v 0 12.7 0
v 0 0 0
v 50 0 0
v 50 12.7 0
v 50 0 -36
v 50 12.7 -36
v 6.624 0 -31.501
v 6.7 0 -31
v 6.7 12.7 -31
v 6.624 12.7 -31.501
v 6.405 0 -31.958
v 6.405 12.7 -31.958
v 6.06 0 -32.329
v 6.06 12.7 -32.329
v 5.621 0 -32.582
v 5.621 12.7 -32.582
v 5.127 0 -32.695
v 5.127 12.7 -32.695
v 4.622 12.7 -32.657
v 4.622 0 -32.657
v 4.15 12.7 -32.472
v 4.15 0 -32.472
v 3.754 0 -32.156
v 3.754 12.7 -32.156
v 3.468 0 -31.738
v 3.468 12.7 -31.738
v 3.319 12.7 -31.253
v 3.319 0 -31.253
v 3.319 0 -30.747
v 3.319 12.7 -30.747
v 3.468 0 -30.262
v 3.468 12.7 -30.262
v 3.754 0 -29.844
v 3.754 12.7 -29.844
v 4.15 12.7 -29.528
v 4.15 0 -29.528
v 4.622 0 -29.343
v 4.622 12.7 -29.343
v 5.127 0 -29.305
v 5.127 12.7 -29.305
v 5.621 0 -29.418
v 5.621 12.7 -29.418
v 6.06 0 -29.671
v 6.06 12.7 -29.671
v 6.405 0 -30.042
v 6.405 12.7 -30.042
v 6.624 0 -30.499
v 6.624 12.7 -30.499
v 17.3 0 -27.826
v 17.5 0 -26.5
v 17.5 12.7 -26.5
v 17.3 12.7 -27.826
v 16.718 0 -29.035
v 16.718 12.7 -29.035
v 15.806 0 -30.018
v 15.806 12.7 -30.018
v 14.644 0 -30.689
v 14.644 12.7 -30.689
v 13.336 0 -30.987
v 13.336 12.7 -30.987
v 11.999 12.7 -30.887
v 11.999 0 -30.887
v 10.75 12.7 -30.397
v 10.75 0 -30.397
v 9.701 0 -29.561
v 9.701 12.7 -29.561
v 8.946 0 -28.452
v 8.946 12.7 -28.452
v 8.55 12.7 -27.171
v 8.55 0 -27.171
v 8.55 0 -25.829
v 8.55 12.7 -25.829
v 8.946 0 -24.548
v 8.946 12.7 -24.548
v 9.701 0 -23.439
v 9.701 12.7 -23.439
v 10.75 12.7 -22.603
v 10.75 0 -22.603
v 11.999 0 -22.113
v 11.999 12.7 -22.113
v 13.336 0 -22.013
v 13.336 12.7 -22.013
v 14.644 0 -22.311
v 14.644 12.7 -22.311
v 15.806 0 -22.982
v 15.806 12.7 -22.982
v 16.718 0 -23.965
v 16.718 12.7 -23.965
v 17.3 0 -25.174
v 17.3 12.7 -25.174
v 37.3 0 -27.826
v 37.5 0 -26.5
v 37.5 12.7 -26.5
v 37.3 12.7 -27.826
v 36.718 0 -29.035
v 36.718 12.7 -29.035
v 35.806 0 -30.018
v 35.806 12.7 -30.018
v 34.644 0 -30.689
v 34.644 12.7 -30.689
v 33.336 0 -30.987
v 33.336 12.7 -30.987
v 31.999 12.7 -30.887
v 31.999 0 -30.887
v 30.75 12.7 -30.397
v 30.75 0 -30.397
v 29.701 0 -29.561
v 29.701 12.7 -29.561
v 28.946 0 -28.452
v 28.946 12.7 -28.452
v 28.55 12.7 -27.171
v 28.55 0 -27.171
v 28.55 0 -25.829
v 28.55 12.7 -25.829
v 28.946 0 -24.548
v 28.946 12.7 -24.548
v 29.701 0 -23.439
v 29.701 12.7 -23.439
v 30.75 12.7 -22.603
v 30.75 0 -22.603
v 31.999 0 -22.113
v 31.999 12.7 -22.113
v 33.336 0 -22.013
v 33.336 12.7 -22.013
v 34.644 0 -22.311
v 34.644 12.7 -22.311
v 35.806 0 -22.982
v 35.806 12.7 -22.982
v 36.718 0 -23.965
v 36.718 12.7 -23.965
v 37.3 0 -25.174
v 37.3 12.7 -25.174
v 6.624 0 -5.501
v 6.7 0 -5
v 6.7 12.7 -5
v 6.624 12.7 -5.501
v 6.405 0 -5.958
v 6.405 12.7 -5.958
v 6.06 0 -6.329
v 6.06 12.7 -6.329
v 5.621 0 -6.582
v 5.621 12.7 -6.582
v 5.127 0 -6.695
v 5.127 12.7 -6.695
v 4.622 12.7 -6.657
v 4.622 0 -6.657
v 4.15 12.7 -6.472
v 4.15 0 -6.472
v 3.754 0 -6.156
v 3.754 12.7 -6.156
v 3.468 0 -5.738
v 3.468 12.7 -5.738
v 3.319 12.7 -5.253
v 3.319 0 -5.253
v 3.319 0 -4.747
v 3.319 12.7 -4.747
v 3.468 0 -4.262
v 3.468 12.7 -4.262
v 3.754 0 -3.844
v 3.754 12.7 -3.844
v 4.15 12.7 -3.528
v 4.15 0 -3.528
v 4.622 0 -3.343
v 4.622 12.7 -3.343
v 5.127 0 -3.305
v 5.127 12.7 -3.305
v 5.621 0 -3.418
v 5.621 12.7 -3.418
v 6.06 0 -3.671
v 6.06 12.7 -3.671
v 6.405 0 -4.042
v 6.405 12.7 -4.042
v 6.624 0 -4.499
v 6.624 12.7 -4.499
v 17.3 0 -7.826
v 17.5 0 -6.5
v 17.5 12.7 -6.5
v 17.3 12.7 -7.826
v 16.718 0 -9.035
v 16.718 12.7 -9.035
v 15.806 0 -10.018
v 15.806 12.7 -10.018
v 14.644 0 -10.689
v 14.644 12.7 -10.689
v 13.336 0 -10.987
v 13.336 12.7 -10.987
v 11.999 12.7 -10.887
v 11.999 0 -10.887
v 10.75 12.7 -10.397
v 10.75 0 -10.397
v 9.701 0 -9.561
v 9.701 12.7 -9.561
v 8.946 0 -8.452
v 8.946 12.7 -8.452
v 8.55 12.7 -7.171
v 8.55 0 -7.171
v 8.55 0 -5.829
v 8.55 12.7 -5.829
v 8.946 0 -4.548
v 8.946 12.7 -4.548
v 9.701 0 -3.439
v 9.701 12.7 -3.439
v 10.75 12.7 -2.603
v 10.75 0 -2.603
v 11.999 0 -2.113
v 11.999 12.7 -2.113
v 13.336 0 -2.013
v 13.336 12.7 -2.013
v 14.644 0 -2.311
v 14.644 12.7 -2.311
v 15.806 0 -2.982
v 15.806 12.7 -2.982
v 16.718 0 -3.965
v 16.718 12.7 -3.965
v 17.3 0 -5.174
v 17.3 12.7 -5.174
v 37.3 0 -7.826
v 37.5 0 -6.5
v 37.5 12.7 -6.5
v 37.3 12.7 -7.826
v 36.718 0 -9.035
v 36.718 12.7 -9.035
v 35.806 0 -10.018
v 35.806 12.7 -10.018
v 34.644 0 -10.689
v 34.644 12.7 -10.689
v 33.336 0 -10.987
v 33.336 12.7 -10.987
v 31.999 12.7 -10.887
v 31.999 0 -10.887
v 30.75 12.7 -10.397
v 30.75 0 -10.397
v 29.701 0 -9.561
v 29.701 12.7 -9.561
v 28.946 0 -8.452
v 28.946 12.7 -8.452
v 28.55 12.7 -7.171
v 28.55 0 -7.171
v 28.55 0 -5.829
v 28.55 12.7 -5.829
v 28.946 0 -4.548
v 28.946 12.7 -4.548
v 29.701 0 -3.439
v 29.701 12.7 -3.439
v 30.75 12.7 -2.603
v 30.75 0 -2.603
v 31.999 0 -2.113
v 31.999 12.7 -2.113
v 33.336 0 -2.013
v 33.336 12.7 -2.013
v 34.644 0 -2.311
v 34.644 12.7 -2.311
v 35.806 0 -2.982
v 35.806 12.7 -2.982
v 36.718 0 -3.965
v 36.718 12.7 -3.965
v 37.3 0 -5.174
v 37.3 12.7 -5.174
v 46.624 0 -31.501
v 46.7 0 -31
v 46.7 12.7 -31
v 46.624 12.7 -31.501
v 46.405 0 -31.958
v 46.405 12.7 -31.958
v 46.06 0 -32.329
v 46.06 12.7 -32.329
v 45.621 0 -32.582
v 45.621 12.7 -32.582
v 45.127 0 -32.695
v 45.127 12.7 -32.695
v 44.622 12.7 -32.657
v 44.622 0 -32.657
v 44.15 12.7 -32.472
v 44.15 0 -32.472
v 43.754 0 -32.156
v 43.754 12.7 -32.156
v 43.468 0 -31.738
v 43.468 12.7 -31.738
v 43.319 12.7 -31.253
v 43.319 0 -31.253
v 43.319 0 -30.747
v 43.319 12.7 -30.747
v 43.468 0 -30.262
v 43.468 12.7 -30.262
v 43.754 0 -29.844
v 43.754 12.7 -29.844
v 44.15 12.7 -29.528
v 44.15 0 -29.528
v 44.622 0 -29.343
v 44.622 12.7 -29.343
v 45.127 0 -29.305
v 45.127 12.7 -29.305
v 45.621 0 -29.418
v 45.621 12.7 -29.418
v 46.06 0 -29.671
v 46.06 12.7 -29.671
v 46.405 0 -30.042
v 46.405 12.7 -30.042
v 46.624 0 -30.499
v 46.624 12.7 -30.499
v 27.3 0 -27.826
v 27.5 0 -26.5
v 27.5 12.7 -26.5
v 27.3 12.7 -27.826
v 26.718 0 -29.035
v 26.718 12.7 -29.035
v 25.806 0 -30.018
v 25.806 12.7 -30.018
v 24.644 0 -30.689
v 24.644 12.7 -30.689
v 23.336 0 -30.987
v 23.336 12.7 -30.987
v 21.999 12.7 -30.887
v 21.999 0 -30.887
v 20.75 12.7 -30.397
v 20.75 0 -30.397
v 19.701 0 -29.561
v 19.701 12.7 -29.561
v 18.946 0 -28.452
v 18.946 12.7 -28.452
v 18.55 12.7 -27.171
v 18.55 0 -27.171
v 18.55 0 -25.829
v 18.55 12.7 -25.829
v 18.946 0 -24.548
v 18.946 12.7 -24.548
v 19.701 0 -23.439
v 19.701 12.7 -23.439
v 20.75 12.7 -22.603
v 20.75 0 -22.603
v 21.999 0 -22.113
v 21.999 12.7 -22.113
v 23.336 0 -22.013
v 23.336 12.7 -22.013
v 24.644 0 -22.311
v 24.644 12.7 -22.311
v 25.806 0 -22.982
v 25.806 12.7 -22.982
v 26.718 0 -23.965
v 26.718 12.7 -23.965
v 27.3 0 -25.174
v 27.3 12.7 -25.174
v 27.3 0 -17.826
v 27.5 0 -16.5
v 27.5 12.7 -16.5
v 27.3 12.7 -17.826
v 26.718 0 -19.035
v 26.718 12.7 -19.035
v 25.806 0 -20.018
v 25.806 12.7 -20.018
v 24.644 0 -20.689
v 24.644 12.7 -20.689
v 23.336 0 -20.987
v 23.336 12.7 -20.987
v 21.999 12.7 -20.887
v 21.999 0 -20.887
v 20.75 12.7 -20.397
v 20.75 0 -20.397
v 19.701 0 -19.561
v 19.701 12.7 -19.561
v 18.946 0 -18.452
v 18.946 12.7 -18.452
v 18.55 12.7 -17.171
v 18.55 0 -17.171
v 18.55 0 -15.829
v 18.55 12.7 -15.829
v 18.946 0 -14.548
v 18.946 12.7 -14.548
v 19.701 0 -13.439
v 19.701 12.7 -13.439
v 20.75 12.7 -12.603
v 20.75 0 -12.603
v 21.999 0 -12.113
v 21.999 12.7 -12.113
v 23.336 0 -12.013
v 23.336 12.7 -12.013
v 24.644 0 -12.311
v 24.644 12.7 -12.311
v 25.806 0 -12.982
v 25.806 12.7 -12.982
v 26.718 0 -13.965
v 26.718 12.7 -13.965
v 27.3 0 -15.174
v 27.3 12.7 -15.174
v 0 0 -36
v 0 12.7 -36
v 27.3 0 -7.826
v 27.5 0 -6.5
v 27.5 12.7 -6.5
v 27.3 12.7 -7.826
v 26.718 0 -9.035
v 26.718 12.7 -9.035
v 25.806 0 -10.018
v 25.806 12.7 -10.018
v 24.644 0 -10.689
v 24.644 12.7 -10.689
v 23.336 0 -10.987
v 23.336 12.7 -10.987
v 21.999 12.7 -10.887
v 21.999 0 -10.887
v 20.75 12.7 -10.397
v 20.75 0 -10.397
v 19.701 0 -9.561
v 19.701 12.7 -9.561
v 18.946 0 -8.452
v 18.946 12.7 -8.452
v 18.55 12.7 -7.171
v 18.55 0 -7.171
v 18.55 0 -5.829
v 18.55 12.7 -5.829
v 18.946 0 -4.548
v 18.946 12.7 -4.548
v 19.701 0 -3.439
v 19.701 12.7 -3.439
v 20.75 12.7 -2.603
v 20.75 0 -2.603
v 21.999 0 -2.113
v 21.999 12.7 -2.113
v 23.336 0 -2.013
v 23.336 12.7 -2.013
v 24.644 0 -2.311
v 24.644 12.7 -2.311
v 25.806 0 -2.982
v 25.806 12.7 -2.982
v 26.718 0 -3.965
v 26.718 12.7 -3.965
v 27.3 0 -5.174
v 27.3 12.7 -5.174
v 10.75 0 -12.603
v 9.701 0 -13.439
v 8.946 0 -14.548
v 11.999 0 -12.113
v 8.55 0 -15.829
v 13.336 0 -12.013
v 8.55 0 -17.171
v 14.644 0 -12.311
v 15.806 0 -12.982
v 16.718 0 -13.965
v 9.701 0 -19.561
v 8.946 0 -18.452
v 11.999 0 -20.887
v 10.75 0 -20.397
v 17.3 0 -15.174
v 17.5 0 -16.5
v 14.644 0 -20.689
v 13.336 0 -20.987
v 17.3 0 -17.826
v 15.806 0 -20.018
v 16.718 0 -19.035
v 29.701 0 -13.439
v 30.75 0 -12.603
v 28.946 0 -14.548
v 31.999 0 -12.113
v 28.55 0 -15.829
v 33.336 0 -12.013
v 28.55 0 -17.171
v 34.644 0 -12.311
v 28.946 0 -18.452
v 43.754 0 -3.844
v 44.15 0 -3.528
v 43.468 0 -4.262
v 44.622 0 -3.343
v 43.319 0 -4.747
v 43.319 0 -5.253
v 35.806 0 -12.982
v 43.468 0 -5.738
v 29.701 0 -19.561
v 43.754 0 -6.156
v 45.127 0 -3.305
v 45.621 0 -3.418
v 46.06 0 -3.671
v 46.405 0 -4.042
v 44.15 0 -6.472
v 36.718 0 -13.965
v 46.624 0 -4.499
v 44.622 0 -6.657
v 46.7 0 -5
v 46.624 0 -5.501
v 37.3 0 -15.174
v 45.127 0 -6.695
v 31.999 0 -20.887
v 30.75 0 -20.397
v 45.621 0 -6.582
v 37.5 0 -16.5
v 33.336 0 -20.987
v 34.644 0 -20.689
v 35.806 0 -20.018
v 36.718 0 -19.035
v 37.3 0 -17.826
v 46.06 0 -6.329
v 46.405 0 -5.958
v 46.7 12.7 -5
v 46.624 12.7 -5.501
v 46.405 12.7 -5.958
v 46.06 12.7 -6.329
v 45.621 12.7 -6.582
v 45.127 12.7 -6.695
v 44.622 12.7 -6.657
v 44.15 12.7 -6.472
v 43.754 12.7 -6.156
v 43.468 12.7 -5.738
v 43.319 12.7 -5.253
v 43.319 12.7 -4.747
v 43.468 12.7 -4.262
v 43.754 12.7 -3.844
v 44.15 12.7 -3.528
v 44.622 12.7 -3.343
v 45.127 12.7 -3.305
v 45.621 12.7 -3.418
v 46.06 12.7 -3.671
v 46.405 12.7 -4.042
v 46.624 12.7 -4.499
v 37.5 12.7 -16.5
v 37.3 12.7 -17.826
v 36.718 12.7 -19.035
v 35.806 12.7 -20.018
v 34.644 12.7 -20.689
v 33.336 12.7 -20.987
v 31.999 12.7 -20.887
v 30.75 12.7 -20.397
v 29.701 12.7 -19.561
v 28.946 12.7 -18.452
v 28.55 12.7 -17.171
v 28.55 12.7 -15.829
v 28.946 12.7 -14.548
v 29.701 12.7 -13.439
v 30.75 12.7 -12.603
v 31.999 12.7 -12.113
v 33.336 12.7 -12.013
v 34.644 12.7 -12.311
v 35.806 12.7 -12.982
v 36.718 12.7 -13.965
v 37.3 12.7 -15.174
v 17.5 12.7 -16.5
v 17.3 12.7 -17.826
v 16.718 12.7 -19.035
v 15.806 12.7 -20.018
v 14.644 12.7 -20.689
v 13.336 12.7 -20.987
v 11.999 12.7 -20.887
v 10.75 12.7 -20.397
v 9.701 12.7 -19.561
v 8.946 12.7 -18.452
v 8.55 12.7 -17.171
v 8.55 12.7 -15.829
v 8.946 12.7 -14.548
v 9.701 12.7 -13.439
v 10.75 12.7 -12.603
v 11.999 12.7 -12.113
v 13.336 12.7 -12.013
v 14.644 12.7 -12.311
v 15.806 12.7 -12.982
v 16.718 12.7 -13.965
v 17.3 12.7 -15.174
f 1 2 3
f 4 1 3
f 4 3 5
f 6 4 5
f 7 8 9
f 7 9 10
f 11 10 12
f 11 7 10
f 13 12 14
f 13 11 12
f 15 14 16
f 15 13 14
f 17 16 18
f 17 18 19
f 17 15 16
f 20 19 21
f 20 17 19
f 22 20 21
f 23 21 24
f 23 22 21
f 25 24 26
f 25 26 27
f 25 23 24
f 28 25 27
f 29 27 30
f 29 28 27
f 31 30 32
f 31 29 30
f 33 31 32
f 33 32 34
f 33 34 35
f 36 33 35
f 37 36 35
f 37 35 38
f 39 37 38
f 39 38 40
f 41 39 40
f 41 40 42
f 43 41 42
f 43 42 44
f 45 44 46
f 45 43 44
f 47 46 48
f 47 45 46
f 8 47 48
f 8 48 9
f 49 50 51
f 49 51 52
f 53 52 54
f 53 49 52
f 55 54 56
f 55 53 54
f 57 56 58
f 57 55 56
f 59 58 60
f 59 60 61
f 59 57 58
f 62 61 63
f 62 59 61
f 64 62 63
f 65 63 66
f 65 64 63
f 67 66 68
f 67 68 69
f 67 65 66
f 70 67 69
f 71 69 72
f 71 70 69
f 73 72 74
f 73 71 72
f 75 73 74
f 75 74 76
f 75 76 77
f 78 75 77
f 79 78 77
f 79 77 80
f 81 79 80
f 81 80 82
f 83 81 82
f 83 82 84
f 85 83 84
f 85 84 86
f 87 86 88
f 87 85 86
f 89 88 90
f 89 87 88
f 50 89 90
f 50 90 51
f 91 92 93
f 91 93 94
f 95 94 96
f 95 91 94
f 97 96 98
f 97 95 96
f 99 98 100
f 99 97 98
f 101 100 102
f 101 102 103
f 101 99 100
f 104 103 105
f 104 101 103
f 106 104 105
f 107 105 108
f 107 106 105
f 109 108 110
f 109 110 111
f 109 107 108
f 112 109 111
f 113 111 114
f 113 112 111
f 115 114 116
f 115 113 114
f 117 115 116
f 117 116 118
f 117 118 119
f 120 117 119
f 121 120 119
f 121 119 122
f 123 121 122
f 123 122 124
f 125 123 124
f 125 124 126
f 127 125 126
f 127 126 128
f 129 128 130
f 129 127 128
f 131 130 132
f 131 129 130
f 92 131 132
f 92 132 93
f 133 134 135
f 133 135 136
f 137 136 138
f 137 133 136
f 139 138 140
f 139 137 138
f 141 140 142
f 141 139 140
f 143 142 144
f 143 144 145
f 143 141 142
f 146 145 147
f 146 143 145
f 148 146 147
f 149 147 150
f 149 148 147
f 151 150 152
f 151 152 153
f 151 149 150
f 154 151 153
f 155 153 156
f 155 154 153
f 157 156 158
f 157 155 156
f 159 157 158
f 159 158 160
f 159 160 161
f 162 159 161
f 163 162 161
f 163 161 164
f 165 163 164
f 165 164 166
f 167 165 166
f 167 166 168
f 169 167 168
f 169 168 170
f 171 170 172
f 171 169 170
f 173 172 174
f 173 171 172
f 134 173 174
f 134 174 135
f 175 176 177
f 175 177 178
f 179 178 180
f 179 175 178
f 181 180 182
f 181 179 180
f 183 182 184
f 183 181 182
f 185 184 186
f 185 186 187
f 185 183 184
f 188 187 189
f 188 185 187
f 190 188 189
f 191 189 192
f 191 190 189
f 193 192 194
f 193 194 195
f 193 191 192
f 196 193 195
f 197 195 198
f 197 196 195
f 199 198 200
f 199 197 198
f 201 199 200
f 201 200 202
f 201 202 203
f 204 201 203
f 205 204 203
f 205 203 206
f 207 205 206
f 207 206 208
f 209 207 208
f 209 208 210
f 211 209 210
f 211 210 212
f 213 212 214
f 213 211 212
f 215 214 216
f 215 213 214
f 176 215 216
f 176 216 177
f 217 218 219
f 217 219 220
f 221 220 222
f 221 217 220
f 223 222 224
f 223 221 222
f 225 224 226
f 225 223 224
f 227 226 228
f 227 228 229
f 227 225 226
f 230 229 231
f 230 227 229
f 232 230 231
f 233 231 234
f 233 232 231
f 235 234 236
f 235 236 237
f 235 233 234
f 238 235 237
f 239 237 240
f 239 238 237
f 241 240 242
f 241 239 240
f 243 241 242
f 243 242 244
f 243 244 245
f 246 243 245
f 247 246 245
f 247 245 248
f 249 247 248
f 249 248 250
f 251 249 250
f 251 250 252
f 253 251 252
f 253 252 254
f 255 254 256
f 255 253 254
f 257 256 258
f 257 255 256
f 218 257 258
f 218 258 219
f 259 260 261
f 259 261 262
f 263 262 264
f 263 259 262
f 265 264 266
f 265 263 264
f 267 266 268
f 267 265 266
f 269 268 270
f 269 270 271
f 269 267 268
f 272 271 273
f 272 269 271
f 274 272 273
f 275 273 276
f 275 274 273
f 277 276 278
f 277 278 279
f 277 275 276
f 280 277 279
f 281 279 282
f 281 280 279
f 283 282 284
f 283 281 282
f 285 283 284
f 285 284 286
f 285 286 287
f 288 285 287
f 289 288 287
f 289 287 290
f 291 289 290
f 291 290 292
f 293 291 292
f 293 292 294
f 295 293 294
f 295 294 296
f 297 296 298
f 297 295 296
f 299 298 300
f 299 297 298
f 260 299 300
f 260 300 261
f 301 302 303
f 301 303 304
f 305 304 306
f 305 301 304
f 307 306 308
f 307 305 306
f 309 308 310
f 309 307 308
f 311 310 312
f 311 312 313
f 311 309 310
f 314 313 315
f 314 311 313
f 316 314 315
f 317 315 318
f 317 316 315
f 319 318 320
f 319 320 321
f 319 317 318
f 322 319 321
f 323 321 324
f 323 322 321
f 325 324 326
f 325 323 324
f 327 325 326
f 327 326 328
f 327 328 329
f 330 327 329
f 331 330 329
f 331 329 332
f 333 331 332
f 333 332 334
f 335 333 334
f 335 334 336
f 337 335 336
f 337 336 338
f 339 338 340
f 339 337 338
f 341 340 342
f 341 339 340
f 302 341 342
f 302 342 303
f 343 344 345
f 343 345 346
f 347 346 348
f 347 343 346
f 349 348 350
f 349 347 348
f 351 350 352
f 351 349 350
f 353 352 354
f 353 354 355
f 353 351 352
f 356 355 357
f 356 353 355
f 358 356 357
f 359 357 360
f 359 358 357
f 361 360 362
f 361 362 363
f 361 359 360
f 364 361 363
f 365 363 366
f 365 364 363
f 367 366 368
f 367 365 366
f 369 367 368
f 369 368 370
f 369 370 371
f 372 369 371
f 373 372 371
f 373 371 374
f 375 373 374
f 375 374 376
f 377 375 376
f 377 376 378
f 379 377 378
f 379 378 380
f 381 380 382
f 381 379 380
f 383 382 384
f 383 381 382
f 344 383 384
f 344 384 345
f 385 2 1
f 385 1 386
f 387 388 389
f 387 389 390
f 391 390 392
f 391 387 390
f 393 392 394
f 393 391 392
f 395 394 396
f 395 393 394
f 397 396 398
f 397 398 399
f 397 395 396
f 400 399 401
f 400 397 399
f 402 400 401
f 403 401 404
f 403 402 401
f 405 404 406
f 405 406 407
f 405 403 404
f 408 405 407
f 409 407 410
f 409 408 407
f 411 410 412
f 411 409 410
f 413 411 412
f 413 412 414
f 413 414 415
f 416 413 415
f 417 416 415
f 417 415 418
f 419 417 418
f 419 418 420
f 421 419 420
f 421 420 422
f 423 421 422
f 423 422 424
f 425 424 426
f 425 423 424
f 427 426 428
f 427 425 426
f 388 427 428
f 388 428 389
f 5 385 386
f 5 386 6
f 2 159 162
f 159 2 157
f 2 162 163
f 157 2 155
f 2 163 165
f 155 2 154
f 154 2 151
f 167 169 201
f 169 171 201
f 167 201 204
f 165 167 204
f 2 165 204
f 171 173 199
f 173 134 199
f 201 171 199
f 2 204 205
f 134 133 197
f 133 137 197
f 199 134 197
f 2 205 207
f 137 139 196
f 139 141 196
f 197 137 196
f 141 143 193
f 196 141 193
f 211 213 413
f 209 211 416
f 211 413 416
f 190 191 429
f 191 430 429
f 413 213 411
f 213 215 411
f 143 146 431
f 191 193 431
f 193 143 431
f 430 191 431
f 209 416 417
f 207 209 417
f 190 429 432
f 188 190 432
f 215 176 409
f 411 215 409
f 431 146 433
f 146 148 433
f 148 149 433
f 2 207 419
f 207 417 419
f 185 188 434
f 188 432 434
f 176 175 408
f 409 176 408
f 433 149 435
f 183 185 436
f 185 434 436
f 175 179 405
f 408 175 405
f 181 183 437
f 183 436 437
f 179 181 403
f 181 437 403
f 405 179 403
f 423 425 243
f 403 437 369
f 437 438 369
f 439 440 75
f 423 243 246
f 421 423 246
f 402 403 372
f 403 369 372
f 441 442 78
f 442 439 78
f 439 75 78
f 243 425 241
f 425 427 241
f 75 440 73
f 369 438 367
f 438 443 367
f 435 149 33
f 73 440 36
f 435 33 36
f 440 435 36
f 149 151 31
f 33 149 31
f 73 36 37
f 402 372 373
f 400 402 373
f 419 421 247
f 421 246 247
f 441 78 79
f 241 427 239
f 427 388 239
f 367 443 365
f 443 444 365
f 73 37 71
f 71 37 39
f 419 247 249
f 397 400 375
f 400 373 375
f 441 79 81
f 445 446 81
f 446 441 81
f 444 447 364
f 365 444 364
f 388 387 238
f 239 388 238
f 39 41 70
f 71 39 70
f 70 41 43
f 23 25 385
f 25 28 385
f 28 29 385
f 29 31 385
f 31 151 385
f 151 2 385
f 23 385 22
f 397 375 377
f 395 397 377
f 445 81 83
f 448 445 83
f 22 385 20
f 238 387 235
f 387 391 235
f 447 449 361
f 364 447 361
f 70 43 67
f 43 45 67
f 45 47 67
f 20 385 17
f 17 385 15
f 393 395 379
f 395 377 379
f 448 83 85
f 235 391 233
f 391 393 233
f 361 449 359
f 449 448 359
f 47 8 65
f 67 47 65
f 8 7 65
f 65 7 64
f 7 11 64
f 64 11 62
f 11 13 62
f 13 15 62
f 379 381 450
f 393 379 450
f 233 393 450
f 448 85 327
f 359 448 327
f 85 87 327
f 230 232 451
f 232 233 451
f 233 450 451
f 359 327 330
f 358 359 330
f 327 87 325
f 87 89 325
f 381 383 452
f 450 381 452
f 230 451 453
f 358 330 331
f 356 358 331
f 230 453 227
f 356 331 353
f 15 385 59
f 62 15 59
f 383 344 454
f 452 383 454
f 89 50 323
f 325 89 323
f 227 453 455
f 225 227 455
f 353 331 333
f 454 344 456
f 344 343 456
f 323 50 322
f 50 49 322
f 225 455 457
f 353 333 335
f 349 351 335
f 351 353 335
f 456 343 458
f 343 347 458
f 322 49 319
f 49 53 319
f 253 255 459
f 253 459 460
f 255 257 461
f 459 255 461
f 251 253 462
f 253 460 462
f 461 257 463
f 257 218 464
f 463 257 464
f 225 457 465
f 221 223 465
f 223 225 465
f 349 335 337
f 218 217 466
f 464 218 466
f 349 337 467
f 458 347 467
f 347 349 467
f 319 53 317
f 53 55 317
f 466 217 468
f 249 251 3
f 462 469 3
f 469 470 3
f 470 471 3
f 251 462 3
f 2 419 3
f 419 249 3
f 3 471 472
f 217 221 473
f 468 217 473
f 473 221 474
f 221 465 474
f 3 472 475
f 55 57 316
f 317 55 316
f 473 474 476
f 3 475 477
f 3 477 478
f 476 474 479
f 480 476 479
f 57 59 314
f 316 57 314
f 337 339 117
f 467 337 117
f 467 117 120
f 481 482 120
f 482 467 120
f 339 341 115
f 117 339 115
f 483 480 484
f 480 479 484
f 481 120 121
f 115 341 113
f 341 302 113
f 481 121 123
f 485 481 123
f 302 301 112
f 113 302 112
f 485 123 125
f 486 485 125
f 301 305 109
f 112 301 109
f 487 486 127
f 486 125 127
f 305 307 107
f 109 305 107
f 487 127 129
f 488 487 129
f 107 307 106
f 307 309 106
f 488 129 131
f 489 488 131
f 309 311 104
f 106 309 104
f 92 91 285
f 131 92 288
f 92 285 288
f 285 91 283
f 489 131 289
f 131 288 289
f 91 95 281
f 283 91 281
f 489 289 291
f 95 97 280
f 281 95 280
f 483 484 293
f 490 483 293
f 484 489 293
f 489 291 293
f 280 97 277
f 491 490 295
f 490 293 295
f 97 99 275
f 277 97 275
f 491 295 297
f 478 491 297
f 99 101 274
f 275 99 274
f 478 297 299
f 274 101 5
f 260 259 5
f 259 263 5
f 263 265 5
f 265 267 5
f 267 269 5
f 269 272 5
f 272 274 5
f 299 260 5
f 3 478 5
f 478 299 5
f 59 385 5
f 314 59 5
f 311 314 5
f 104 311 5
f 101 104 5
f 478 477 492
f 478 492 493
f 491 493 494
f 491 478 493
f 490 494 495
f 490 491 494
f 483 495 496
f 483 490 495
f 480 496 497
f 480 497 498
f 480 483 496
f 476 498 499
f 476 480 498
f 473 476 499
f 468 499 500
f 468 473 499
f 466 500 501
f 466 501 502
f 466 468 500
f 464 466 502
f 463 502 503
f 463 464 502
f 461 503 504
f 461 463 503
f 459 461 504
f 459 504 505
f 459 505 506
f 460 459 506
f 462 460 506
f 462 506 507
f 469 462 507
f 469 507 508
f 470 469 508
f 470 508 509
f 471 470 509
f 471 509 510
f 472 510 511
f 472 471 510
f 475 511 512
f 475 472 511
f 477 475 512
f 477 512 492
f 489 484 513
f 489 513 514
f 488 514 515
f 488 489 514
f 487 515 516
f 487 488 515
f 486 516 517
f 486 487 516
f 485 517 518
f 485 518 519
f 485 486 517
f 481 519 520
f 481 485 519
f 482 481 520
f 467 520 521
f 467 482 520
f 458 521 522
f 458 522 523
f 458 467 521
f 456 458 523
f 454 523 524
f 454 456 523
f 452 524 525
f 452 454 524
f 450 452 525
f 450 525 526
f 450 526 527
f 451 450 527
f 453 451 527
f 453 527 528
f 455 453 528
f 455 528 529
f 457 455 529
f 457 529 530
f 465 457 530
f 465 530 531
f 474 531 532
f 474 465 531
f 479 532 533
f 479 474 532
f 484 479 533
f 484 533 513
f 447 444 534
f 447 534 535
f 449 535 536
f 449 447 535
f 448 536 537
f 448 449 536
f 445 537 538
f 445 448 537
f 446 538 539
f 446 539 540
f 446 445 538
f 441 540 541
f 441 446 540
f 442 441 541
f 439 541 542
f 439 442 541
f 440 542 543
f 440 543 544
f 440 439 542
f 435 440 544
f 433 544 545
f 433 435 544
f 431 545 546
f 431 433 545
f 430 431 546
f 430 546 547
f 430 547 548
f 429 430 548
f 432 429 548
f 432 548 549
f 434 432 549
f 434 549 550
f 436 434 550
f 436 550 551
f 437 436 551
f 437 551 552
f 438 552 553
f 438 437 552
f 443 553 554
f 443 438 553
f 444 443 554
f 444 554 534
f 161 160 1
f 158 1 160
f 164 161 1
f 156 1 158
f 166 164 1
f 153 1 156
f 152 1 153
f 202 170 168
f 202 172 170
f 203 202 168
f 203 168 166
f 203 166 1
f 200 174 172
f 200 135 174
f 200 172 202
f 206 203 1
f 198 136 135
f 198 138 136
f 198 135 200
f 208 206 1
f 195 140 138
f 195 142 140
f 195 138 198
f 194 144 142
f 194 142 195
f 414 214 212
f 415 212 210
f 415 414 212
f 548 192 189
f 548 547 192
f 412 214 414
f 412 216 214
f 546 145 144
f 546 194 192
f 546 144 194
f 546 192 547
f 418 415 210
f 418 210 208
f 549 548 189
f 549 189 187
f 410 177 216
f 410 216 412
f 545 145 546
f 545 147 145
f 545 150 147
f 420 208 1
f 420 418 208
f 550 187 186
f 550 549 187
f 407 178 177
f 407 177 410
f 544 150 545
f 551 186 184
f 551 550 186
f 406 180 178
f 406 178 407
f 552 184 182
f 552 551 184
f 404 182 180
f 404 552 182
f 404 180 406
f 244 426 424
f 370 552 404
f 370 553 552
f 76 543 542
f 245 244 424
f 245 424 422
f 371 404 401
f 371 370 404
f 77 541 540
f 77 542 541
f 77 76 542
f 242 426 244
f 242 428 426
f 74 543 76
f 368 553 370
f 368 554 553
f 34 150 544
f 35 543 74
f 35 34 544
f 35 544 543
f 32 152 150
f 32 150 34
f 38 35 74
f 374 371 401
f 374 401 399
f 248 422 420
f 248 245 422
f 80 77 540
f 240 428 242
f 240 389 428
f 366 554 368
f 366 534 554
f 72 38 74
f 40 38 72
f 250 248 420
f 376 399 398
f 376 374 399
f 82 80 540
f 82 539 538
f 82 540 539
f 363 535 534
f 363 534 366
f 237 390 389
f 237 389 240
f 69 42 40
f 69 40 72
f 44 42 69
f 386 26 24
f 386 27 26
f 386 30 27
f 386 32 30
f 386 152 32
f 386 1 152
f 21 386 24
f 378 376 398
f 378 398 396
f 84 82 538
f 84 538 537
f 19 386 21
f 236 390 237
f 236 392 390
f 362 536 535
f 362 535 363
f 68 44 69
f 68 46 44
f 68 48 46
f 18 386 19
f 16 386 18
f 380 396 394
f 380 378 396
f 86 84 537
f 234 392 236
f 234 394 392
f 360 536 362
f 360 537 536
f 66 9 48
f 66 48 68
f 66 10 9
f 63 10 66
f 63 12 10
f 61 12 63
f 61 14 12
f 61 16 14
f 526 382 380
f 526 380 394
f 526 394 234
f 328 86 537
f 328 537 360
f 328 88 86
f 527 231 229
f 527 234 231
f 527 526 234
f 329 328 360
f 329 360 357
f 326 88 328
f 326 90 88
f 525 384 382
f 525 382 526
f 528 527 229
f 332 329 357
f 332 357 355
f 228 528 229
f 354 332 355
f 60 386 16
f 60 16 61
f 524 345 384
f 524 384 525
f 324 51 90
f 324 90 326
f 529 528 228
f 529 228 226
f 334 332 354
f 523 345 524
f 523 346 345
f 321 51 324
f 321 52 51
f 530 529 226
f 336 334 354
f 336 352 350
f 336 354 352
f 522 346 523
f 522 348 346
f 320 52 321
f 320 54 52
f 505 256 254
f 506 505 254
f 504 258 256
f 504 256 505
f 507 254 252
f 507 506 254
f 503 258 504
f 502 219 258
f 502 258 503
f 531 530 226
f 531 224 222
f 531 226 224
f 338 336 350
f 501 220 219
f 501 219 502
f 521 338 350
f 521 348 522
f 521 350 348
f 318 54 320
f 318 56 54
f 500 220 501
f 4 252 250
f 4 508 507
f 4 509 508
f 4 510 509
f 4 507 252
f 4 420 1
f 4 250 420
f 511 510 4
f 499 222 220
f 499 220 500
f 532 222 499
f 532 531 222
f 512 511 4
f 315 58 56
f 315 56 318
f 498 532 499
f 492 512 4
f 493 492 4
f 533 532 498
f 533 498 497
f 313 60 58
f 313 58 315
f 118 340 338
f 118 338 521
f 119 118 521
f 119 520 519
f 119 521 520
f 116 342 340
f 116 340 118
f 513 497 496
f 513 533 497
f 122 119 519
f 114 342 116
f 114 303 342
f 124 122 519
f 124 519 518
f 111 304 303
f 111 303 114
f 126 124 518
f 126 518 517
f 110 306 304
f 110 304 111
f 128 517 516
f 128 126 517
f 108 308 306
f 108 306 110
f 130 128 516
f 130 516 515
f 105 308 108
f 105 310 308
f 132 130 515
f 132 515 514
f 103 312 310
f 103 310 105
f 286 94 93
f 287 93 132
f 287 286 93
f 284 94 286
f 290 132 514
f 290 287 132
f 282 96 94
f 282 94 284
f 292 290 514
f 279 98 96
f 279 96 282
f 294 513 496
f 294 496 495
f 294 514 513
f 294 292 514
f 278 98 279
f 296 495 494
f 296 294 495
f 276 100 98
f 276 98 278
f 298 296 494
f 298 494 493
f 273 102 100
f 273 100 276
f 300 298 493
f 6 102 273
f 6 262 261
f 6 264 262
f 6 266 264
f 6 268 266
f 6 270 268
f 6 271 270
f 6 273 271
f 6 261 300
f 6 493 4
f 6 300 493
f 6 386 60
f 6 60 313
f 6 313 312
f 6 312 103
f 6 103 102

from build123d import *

# Parameters (mm, degrees)
SKETCH1_W           = 50
SKETCH1_H           = 36
SKETCH1_R           = 4.5
SKETCH1_R_2         = 1.7
BOSS_EXTRUDE1_DEPTH = 12.7


with BuildPart() as part:
    # Sketch1 → Boss-Extrude1 (new body)
    with BuildSketch(Plane(origin=(0, 0, 0), x_dir=(1, 0, 0), z_dir=(0, 1, 0))):
        with Locations((25, 18)):
            Rectangle(SKETCH1_W, SKETCH1_H)
        with Locations((13, 6.5)):
            Circle(SKETCH1_R, mode=Mode.SUBTRACT)
        with Locations((5, 5)):
            Circle(SKETCH1_R_2, mode=Mode.SUBTRACT)
        with Locations((5, 31)):
            Circle(SKETCH1_R_2, mode=Mode.SUBTRACT)
        with Locations((45, 31)):
            Circle(SKETCH1_R_2, mode=Mode.SUBTRACT)
        with Locations((45, 5)):
            Circle(SKETCH1_R_2, mode=Mode.SUBTRACT)
        with Locations((23, 6.5)):
            Circle(SKETCH1_R, mode=Mode.SUBTRACT)
        with Locations((33, 6.5)):
            Circle(SKETCH1_R, mode=Mode.SUBTRACT)
        with Locations((23, 16.5)):
            Circle(SKETCH1_R, mode=Mode.SUBTRACT)
        with Locations((33, 16.5)):
            Circle(SKETCH1_R, mode=Mode.SUBTRACT)
        with Locations((23, 26.5)):
            Circle(SKETCH1_R, mode=Mode.SUBTRACT)
        with Locations((33, 26.5)):
            Circle(SKETCH1_R, mode=Mode.SUBTRACT)
        with Locations((13, 16.5)):
            Circle(SKETCH1_R, mode=Mode.SUBTRACT)
        with Locations((13, 26.5)):
            Circle(SKETCH1_R, mode=Mode.SUBTRACT)
    extrude(amount=BOSS_EXTRUDE1_DEPTH)


solid = part.part
